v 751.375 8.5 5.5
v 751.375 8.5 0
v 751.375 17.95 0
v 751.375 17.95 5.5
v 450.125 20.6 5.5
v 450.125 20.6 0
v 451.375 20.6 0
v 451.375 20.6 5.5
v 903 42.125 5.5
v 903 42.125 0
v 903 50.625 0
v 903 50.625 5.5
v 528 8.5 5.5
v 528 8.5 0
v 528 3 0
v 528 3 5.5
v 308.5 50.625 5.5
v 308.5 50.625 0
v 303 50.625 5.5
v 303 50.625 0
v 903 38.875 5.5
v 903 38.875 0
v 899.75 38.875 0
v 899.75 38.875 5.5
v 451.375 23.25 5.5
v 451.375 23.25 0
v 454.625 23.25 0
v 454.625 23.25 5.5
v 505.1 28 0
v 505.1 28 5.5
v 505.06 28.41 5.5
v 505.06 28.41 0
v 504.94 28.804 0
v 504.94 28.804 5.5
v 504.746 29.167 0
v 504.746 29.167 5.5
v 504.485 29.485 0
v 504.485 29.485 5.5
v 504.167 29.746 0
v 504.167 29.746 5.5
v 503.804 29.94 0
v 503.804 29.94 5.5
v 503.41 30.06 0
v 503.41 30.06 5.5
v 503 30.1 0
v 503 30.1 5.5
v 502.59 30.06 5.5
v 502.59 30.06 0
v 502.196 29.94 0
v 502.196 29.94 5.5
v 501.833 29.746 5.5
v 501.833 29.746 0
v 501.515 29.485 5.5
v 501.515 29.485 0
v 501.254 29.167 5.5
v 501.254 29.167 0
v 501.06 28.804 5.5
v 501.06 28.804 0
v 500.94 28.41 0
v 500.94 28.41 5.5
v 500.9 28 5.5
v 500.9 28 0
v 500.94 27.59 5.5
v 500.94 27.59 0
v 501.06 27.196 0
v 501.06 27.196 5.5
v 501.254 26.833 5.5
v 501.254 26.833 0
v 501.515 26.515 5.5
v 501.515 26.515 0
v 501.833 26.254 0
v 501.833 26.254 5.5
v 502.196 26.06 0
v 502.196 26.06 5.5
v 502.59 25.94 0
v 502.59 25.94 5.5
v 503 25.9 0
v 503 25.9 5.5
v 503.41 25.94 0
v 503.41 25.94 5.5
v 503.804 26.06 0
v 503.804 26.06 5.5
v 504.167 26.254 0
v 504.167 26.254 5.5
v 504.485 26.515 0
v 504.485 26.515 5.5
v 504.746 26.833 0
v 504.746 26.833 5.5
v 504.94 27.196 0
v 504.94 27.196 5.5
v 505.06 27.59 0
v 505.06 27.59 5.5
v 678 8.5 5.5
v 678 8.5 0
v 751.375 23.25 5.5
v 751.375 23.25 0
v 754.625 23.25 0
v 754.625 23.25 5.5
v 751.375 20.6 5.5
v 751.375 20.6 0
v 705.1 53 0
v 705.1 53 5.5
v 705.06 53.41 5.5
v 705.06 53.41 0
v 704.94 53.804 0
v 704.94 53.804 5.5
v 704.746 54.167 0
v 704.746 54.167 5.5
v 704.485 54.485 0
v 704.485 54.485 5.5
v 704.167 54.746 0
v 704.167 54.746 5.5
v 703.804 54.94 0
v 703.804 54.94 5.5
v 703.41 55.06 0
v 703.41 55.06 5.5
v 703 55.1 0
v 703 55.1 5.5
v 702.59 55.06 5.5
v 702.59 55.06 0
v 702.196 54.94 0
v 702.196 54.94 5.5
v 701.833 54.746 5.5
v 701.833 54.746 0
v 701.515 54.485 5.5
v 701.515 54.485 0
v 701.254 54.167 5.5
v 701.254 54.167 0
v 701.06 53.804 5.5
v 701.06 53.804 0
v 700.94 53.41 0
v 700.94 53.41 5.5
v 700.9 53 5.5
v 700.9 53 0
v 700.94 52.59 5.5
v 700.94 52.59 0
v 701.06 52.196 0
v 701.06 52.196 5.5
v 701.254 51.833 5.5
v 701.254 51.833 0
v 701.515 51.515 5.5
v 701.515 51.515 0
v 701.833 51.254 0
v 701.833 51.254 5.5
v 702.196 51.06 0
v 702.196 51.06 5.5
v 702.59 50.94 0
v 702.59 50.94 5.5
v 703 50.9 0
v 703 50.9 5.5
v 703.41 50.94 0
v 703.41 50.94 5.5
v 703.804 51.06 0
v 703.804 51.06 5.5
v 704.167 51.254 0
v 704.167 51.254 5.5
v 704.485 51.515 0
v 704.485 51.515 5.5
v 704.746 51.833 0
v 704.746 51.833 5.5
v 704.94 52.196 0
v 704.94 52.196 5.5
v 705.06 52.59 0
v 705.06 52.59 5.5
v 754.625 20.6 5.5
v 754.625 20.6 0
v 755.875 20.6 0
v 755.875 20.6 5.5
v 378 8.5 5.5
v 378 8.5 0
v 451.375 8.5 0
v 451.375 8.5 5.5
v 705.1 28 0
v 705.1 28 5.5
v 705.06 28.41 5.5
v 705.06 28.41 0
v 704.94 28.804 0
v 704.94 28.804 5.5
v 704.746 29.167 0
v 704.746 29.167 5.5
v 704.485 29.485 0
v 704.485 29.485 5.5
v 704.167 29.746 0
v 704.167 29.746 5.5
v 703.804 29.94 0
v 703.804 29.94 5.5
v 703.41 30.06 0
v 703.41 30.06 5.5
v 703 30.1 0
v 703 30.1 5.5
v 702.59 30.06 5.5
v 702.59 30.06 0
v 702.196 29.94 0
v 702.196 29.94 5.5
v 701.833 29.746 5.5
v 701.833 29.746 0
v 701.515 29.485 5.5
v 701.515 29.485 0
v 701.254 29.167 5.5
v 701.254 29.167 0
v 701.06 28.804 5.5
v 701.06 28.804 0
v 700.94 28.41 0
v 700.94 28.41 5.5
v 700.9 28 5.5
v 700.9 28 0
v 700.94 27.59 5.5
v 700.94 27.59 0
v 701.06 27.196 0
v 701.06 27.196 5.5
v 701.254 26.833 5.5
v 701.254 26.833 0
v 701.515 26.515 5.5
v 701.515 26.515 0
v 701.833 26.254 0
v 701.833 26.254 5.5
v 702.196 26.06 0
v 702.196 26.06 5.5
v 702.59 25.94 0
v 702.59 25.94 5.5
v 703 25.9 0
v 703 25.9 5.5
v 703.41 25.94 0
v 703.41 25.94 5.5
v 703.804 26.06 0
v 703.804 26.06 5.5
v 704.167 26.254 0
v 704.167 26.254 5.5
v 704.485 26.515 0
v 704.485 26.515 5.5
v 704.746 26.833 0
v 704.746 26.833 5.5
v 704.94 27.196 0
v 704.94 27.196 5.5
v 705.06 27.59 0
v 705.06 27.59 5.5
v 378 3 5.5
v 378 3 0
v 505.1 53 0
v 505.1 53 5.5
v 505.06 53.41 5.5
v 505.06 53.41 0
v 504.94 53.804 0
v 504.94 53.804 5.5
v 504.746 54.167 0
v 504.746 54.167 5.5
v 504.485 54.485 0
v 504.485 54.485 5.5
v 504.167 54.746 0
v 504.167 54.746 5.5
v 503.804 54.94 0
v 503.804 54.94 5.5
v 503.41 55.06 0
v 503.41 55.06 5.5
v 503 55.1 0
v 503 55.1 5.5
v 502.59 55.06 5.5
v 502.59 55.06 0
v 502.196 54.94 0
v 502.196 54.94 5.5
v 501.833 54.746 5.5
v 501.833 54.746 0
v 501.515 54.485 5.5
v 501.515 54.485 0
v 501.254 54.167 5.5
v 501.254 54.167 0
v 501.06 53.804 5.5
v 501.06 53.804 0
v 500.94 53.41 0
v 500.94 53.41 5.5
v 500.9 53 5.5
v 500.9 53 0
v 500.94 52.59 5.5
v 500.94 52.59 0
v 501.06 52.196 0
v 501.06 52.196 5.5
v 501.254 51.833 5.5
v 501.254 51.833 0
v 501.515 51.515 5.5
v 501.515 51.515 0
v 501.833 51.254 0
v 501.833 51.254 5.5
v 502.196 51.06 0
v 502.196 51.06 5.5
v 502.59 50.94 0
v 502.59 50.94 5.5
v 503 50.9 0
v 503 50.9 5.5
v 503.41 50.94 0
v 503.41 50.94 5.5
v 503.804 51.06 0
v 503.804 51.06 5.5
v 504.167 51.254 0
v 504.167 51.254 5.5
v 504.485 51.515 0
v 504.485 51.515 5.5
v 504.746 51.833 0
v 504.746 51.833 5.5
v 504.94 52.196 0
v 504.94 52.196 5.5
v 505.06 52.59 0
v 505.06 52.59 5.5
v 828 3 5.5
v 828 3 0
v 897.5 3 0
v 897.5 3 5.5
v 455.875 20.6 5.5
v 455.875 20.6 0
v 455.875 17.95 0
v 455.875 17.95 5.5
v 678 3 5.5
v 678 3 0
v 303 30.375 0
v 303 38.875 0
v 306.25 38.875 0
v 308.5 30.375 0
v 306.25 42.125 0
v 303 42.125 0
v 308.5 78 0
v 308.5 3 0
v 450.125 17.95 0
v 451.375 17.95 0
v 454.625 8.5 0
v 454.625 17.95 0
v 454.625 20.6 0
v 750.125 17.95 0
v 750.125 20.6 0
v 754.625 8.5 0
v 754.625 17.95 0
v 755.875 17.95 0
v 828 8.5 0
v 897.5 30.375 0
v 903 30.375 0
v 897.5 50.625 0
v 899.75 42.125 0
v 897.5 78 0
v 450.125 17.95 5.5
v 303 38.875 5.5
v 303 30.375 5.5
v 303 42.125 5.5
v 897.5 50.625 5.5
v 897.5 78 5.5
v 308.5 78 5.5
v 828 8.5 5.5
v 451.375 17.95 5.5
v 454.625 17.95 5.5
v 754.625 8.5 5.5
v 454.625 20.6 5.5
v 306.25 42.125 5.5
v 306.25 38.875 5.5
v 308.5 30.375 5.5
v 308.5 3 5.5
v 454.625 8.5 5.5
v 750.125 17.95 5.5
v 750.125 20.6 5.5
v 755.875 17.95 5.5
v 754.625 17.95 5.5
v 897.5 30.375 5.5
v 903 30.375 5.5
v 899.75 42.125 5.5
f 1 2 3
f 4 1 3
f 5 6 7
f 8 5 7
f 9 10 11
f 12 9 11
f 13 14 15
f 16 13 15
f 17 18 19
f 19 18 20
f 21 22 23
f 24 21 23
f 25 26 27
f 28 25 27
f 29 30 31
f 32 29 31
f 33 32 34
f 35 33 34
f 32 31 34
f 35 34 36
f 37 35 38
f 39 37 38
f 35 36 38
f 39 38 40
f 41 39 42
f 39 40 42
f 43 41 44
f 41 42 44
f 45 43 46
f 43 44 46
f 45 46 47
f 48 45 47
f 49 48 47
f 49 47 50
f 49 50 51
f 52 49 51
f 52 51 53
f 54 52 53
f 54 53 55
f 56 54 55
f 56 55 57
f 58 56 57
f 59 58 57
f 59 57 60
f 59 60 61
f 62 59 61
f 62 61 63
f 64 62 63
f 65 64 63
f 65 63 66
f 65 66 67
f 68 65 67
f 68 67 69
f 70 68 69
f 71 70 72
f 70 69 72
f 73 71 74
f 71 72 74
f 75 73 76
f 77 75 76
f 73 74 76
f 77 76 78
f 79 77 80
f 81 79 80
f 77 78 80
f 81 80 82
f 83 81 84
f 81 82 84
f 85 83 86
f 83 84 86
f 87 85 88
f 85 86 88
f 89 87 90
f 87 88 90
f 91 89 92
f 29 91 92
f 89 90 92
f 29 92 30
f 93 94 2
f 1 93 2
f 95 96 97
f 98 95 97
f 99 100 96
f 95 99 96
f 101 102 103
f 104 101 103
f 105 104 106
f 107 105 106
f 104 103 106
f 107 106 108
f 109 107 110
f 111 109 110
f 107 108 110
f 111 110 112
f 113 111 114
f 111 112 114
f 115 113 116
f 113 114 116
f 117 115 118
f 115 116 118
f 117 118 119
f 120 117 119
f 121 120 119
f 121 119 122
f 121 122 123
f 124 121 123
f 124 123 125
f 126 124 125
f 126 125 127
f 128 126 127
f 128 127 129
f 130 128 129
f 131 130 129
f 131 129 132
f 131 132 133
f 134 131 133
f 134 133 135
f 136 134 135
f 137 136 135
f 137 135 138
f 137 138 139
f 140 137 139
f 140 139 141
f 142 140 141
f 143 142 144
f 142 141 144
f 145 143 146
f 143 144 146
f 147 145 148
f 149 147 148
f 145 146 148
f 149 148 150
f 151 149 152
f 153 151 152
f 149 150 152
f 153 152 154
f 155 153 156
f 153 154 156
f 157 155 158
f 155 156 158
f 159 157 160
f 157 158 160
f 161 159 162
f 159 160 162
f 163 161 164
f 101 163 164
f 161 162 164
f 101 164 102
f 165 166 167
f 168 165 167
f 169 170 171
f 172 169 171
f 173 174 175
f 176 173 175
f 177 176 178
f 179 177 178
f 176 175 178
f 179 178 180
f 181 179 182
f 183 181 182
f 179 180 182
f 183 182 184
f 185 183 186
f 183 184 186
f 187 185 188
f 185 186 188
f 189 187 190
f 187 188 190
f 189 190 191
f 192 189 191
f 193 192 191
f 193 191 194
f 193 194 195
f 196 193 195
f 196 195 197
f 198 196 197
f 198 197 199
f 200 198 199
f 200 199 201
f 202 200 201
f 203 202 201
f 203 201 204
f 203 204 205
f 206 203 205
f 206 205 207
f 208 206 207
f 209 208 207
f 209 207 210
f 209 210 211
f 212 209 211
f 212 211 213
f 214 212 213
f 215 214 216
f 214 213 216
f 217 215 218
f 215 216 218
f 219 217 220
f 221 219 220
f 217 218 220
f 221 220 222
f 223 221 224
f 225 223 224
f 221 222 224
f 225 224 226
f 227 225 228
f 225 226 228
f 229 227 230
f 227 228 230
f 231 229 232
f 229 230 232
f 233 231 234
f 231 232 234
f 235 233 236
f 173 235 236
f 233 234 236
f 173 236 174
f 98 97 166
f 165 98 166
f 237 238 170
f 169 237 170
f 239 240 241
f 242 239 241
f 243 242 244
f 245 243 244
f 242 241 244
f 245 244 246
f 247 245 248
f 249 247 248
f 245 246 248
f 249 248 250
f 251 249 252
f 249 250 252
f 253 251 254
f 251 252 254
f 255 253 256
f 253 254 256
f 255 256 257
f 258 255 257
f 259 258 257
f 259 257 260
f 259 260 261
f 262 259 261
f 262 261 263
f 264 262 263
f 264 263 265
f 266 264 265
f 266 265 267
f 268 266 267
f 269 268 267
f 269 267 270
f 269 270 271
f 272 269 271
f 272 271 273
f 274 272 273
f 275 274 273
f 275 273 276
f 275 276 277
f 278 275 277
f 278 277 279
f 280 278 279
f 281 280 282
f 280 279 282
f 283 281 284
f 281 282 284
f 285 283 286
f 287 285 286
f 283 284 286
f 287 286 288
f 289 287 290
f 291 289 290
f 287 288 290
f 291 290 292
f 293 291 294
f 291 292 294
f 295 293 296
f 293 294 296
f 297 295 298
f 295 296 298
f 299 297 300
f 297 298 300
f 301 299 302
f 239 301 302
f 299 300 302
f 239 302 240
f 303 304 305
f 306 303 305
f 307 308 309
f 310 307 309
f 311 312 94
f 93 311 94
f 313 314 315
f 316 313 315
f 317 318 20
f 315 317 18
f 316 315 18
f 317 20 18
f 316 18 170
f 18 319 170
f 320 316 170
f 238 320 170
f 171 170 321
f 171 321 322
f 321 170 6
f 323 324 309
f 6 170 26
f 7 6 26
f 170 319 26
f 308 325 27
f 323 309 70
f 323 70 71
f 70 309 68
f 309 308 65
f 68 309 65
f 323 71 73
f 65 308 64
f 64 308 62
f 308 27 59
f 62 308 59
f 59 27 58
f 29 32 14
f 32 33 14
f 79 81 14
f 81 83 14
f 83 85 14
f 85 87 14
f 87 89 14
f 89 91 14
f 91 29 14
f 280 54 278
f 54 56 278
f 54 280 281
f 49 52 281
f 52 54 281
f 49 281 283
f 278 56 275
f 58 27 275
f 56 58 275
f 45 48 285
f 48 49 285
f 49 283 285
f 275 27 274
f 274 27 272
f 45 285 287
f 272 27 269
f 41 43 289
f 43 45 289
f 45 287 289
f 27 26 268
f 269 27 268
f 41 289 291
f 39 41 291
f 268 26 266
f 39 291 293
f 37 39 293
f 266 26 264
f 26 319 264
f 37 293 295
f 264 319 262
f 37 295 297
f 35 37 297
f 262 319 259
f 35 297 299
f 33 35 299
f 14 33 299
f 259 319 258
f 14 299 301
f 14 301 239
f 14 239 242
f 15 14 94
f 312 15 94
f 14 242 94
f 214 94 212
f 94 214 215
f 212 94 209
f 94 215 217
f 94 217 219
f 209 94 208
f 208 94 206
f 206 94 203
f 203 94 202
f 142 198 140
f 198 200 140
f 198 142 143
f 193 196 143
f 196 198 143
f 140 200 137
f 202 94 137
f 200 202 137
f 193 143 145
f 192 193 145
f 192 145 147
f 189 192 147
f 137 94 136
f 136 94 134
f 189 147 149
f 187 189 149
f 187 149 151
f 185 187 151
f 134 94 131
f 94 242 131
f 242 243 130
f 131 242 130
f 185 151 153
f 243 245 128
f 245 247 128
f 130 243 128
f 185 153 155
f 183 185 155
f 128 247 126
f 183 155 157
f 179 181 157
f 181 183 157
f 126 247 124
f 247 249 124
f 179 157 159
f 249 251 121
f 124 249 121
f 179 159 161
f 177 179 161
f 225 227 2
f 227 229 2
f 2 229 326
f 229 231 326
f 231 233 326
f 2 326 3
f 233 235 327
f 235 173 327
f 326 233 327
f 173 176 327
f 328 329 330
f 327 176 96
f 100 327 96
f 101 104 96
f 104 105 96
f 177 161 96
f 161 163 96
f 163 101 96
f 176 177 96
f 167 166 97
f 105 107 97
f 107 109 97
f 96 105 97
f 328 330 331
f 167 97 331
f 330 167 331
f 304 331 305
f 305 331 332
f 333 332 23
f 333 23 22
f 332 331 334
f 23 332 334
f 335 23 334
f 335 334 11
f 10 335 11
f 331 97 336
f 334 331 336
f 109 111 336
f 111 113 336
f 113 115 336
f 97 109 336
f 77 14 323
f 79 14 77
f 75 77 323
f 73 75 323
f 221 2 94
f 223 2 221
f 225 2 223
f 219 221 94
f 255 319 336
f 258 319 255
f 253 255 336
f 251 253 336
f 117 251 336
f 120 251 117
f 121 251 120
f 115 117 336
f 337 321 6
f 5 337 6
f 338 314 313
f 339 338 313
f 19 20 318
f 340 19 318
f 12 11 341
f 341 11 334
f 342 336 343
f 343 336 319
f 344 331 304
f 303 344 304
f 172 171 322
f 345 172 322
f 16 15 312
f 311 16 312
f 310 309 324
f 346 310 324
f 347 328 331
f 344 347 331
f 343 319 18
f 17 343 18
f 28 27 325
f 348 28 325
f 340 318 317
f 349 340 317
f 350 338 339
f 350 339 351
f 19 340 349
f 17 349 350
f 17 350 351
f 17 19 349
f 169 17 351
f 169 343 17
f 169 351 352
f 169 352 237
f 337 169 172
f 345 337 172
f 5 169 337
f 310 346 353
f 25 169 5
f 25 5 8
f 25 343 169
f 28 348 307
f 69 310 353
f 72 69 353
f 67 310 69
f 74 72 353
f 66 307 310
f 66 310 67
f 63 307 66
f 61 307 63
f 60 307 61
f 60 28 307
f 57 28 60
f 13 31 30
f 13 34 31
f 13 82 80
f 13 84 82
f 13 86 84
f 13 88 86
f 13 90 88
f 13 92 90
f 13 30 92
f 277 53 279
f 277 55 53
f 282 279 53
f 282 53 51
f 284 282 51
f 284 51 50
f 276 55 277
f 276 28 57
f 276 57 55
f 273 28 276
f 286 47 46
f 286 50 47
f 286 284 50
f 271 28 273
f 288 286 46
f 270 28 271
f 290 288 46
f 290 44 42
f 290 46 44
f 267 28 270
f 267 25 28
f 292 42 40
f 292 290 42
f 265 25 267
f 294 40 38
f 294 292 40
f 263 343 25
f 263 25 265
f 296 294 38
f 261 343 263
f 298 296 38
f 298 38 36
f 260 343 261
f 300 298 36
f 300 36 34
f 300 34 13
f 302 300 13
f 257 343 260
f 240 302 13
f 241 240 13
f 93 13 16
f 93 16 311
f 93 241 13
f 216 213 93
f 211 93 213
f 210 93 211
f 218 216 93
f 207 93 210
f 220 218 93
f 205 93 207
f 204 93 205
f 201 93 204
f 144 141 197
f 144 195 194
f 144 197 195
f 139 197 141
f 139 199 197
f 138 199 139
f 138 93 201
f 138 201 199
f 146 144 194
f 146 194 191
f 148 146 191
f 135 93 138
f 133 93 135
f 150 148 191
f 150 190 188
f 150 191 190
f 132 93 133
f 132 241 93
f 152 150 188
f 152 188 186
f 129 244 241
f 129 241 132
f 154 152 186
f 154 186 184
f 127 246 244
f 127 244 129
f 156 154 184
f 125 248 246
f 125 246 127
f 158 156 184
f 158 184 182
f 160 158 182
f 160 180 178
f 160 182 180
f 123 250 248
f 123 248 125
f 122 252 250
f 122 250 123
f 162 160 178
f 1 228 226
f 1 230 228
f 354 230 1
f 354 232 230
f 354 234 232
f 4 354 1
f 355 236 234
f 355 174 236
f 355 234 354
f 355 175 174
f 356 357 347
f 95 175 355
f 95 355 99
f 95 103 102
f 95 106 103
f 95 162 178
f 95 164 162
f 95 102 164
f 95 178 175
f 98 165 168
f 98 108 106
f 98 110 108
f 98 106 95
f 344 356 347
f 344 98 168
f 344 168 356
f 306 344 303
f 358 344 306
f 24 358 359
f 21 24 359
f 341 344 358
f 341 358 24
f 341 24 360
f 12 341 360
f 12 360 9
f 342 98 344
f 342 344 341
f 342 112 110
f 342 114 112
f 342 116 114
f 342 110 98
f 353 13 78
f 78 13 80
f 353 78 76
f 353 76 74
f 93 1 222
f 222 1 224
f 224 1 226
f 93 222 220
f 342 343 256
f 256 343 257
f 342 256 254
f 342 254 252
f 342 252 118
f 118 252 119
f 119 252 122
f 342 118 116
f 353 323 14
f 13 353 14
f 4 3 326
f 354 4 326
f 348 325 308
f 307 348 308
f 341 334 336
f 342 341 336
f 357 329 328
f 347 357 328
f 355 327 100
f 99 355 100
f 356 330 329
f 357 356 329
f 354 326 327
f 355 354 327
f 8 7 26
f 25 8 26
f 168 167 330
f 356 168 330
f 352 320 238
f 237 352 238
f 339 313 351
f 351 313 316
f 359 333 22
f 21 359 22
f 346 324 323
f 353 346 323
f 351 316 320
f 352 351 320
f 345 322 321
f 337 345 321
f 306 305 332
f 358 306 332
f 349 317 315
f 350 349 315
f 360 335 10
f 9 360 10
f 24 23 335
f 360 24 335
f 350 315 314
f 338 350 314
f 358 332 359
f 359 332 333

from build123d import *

# Parameters (mm, degrees)
BOSS_EXTRUDE1_DEPTH = 5.5
SKETCH2_R           = 2.1
CUT_EXTRUDE1_DEPTH  = 907.379197687


with BuildPart() as part:
    # Sketch1 → Boss-Extrude1 (new body)
    with BuildSketch(Plane.XY):
        Polygon((308.5, 78), (308.5, 50.625), (303, 50.625), (303, 42.125), (306.25, 42.125), (306.25, 40.5), (306.25, 38.875), (303, 38.875), (303, 30.375), (308.5, 30.375), (308.5, 3), (378, 3), (378, 8.5), (451.375, 8.5), (451.375, 17.95), (450.125, 17.95), (450.125, 20.6), (451.375, 20.6), (451.375, 23.25), (454.625, 23.25), (454.625, 20.6), (455.875, 20.6), (455.875, 17.95), (454.625, 17.95), (454.625, 8.5), (528, 8.5), (528, 3), (678, 3), (678, 8.5), (751.375, 8.5), (751.375, 17.95), (750.125, 17.95), (750.125, 20.6), (751.375, 20.6), (751.375, 23.25), (754.625, 23.25), (754.625, 20.6), (755.875, 20.6), (755.875, 17.95), (754.625, 17.95), (754.625, 8.5), (828, 8.5), (828, 3), (897.5, 3), (897.5, 30.375), (903, 30.375), (903, 38.875), (899.75, 38.875), (899.75, 40.5), (899.75, 42.125), (903, 42.125), (903, 50.625), (897.5, 50.625), (897.5, 78), align=None)
    extrude(amount=BOSS_EXTRUDE1_DEPTH)

    # Sketch2 → Cut-Extrude1 (cut, through all)
    with BuildSketch(Plane.XY.offset(5.5)):
        with Locations((503, 53)):
            Circle(SKETCH2_R)
        with Locations((503, 28)):
            Circle(SKETCH2_R)
        with Locations((703, 28)):
            Circle(SKETCH2_R)
        with Locations((703, 53)):
            Circle(SKETCH2_R)
    extrude(amount=-CUT_EXTRUDE1_DEPTH, mode=Mode.SUBTRACT)


solid = part.part
